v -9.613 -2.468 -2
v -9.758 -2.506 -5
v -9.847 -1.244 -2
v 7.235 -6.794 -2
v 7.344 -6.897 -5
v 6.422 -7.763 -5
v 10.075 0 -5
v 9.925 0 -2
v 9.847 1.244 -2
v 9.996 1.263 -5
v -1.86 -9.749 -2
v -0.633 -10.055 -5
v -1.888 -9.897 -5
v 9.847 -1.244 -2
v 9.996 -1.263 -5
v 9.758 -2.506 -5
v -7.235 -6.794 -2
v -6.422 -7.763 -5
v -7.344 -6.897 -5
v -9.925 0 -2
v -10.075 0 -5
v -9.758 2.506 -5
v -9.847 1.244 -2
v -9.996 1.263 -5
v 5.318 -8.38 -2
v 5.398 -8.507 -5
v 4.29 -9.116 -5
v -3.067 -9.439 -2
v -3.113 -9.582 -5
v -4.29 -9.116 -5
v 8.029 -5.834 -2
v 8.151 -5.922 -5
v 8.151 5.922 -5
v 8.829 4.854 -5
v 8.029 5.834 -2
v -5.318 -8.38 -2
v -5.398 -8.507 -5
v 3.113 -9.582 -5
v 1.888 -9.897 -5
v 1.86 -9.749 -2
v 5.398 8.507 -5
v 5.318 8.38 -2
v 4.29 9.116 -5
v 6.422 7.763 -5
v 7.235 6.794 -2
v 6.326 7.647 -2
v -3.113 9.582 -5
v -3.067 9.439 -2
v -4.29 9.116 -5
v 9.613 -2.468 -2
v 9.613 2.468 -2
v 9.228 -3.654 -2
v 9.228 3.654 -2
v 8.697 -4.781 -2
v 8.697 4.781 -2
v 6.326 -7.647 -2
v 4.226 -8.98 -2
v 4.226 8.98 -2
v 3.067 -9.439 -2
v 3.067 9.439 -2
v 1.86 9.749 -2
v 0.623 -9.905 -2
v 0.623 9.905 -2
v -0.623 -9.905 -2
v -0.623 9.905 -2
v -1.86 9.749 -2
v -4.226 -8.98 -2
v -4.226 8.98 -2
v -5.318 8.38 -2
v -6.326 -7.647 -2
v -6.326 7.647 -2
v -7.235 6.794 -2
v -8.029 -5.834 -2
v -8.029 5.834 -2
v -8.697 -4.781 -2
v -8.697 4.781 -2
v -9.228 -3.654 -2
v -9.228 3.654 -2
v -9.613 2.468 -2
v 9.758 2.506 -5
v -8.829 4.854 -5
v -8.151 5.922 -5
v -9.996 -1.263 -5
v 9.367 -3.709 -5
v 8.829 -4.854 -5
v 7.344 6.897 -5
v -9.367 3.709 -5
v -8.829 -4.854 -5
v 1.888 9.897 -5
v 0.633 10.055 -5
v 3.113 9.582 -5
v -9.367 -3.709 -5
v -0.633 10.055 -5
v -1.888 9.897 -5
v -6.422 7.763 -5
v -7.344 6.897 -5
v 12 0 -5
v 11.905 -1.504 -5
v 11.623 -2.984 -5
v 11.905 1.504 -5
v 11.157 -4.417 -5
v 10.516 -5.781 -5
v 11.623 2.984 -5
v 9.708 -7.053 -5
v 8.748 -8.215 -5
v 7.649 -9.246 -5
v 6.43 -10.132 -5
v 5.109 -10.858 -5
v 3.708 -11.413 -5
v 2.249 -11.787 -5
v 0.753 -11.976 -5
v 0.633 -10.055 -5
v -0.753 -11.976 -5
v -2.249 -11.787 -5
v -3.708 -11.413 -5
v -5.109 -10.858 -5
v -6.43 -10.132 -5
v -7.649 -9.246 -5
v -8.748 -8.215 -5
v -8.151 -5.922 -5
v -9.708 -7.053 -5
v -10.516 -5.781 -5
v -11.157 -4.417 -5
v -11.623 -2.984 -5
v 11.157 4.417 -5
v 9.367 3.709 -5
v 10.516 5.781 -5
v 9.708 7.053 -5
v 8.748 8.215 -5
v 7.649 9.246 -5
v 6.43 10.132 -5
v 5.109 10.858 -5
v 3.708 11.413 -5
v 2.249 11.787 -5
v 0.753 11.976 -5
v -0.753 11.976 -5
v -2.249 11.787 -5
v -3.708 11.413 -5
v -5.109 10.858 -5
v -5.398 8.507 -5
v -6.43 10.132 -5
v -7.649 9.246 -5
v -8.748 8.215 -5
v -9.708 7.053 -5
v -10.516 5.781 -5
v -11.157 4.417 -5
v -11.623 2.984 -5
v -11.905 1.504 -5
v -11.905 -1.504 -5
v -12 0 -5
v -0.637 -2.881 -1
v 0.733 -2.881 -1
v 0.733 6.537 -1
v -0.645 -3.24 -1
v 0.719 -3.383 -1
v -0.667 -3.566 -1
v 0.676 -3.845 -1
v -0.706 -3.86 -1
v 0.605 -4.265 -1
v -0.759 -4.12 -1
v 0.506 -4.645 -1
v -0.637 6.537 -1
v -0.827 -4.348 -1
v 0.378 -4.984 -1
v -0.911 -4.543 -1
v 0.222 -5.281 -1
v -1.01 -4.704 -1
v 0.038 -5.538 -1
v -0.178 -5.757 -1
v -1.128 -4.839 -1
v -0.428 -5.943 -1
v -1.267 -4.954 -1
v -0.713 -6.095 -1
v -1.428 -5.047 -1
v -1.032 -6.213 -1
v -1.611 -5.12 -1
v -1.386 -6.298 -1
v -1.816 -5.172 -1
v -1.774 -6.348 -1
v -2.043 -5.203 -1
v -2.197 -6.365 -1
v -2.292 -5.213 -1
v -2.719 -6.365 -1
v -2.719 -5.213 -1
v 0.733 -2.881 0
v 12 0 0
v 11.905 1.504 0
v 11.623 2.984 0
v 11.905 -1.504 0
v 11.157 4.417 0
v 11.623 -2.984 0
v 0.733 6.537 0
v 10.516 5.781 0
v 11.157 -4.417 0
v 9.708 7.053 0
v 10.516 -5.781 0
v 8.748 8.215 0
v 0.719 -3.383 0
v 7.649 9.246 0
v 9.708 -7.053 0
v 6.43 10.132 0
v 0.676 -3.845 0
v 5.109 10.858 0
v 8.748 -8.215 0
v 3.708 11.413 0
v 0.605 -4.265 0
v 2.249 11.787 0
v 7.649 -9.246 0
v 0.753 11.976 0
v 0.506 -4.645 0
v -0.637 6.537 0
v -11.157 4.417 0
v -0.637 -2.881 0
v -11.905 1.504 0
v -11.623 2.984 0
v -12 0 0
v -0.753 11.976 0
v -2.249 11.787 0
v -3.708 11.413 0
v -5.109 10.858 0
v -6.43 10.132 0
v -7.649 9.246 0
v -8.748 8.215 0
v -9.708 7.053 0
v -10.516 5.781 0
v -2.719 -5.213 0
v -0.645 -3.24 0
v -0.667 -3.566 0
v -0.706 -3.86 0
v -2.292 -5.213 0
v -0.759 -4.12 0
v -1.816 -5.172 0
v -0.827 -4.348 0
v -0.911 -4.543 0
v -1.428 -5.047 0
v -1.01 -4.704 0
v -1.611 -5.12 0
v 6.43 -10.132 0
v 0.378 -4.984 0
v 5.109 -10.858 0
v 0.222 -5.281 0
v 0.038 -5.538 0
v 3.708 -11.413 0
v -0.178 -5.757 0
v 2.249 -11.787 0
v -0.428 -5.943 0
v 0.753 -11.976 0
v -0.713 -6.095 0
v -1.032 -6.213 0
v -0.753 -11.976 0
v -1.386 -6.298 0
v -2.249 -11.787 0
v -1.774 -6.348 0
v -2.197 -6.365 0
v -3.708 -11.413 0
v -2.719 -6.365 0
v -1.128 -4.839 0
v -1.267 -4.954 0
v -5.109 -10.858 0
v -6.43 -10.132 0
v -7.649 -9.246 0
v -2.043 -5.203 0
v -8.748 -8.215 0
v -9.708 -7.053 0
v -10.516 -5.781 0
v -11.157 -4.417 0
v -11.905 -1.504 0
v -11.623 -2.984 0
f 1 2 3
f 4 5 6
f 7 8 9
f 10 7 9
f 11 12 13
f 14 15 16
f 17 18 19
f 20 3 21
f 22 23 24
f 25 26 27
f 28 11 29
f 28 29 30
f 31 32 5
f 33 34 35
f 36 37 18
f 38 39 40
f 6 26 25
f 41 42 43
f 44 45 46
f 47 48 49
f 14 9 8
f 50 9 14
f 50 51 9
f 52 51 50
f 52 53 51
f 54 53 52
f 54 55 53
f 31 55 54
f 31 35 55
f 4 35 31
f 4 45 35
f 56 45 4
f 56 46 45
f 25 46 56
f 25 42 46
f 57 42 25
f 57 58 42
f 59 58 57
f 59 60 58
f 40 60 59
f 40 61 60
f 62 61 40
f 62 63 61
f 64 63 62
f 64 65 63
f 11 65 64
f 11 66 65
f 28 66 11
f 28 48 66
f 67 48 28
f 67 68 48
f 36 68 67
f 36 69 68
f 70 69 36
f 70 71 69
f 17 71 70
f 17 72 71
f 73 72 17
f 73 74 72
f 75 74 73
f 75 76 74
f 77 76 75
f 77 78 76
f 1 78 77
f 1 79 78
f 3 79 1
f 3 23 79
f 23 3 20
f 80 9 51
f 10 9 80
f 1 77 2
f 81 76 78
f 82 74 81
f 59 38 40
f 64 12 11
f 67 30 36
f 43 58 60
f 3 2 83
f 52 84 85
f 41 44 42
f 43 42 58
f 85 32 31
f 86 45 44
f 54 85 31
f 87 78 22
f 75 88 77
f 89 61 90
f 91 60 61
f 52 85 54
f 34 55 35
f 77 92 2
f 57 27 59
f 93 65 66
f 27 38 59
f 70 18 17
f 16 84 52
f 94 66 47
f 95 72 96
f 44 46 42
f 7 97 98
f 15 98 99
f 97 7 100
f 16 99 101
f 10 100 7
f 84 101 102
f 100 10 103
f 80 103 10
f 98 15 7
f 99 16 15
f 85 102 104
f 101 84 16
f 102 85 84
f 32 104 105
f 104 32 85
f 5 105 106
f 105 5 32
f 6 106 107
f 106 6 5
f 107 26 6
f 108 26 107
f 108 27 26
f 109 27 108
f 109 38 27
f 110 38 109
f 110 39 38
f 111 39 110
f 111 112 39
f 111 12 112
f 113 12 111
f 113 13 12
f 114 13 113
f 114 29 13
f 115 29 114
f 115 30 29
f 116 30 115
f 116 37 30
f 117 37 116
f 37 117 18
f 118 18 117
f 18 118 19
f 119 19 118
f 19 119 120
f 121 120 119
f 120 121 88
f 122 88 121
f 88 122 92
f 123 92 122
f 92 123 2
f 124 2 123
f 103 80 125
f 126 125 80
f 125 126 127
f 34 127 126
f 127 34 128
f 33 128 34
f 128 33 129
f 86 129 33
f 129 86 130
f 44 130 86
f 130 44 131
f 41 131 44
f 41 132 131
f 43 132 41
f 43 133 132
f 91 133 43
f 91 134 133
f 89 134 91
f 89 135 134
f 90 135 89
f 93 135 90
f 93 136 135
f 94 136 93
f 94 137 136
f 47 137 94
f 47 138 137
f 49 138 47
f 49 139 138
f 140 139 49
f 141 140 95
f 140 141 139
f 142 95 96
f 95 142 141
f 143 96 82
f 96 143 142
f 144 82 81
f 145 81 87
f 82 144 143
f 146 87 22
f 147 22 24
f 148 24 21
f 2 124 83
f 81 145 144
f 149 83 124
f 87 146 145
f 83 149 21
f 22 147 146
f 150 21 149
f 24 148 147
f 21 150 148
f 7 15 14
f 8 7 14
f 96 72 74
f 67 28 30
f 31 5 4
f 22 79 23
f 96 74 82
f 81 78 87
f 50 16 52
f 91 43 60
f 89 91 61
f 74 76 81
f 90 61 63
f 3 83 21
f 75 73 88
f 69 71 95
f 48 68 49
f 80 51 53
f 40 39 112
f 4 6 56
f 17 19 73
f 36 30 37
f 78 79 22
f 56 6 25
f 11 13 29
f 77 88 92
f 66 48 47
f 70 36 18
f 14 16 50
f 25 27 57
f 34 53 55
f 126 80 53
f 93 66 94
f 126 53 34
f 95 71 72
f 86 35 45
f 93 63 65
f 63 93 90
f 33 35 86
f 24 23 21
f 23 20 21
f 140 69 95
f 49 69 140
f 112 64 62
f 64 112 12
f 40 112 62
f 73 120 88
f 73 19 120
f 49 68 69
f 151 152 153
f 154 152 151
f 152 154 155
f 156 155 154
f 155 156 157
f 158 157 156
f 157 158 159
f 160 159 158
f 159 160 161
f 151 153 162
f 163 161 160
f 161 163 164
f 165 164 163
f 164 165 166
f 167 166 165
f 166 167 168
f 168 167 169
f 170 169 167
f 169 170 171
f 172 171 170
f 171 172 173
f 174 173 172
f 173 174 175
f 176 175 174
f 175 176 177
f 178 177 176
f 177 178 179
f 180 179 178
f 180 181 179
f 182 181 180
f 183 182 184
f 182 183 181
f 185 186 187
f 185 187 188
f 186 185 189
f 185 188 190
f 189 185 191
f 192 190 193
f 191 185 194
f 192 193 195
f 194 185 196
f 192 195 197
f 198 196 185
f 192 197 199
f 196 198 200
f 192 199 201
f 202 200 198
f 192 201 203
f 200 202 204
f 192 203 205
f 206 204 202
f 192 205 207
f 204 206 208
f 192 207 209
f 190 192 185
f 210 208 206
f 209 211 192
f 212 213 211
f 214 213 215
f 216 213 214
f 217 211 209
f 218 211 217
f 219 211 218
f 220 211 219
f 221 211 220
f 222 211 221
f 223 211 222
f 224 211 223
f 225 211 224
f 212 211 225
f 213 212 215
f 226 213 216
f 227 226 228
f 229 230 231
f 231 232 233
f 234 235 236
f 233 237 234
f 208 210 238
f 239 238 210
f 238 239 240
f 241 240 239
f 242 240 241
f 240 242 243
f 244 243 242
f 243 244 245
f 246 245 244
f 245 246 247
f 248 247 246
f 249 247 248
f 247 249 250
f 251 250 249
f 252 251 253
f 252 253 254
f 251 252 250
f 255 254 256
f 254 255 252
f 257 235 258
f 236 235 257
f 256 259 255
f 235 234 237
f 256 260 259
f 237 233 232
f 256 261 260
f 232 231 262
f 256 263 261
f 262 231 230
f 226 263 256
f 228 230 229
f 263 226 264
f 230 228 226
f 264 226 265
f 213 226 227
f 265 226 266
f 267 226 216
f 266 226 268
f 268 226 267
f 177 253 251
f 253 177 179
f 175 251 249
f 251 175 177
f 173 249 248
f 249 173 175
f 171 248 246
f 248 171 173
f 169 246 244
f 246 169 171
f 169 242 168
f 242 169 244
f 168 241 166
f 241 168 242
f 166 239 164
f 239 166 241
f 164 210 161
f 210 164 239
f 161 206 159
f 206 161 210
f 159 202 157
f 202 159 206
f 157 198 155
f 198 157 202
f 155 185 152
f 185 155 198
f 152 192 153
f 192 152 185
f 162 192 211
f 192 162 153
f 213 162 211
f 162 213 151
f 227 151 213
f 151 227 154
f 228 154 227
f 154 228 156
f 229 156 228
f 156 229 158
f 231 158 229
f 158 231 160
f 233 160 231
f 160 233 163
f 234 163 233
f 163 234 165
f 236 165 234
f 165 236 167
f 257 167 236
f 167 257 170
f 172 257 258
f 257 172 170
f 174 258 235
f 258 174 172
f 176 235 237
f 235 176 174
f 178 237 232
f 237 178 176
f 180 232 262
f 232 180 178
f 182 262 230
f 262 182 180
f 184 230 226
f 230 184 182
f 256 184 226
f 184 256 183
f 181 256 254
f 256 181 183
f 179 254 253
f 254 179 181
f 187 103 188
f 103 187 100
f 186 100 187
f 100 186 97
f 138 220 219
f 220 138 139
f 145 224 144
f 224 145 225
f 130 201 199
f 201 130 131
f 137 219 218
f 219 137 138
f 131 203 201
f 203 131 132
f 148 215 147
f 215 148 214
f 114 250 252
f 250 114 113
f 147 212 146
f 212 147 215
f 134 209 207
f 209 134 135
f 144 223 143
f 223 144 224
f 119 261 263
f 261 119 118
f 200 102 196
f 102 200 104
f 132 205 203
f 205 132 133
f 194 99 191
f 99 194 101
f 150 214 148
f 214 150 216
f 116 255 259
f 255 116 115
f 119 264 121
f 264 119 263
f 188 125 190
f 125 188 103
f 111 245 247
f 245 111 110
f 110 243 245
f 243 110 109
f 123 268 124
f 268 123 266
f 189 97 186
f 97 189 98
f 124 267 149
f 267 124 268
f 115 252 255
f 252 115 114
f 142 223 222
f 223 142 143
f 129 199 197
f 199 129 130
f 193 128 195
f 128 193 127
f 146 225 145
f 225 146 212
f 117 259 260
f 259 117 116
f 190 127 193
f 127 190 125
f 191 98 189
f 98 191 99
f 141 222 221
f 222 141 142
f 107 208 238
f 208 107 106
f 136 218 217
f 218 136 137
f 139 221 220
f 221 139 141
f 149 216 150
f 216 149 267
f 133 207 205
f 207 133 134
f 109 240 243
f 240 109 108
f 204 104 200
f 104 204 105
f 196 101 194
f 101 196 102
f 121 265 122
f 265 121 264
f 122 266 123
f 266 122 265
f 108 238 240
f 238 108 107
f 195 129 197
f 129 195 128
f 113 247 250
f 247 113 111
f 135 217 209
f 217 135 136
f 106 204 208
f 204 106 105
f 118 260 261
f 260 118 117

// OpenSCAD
$fn = 50;

difference() {
	union() {
		translate(v = [0, 0, -5.0]) {
			cylinder(h = 5, r = 12.0);
		}
	}
	union() {
		#translate(v = [0, 0, -5.0]) {
			cylinder(h = 3, r1 = 10.075, r2 = 9.925);
		}
		translate(v = [0, 0, -1]) {
			linear_extrude(height = 1) {
				text(font = "Impact", halign = "center", size = 10, text = "J", valign = "center");
			}
		}
	}
}
